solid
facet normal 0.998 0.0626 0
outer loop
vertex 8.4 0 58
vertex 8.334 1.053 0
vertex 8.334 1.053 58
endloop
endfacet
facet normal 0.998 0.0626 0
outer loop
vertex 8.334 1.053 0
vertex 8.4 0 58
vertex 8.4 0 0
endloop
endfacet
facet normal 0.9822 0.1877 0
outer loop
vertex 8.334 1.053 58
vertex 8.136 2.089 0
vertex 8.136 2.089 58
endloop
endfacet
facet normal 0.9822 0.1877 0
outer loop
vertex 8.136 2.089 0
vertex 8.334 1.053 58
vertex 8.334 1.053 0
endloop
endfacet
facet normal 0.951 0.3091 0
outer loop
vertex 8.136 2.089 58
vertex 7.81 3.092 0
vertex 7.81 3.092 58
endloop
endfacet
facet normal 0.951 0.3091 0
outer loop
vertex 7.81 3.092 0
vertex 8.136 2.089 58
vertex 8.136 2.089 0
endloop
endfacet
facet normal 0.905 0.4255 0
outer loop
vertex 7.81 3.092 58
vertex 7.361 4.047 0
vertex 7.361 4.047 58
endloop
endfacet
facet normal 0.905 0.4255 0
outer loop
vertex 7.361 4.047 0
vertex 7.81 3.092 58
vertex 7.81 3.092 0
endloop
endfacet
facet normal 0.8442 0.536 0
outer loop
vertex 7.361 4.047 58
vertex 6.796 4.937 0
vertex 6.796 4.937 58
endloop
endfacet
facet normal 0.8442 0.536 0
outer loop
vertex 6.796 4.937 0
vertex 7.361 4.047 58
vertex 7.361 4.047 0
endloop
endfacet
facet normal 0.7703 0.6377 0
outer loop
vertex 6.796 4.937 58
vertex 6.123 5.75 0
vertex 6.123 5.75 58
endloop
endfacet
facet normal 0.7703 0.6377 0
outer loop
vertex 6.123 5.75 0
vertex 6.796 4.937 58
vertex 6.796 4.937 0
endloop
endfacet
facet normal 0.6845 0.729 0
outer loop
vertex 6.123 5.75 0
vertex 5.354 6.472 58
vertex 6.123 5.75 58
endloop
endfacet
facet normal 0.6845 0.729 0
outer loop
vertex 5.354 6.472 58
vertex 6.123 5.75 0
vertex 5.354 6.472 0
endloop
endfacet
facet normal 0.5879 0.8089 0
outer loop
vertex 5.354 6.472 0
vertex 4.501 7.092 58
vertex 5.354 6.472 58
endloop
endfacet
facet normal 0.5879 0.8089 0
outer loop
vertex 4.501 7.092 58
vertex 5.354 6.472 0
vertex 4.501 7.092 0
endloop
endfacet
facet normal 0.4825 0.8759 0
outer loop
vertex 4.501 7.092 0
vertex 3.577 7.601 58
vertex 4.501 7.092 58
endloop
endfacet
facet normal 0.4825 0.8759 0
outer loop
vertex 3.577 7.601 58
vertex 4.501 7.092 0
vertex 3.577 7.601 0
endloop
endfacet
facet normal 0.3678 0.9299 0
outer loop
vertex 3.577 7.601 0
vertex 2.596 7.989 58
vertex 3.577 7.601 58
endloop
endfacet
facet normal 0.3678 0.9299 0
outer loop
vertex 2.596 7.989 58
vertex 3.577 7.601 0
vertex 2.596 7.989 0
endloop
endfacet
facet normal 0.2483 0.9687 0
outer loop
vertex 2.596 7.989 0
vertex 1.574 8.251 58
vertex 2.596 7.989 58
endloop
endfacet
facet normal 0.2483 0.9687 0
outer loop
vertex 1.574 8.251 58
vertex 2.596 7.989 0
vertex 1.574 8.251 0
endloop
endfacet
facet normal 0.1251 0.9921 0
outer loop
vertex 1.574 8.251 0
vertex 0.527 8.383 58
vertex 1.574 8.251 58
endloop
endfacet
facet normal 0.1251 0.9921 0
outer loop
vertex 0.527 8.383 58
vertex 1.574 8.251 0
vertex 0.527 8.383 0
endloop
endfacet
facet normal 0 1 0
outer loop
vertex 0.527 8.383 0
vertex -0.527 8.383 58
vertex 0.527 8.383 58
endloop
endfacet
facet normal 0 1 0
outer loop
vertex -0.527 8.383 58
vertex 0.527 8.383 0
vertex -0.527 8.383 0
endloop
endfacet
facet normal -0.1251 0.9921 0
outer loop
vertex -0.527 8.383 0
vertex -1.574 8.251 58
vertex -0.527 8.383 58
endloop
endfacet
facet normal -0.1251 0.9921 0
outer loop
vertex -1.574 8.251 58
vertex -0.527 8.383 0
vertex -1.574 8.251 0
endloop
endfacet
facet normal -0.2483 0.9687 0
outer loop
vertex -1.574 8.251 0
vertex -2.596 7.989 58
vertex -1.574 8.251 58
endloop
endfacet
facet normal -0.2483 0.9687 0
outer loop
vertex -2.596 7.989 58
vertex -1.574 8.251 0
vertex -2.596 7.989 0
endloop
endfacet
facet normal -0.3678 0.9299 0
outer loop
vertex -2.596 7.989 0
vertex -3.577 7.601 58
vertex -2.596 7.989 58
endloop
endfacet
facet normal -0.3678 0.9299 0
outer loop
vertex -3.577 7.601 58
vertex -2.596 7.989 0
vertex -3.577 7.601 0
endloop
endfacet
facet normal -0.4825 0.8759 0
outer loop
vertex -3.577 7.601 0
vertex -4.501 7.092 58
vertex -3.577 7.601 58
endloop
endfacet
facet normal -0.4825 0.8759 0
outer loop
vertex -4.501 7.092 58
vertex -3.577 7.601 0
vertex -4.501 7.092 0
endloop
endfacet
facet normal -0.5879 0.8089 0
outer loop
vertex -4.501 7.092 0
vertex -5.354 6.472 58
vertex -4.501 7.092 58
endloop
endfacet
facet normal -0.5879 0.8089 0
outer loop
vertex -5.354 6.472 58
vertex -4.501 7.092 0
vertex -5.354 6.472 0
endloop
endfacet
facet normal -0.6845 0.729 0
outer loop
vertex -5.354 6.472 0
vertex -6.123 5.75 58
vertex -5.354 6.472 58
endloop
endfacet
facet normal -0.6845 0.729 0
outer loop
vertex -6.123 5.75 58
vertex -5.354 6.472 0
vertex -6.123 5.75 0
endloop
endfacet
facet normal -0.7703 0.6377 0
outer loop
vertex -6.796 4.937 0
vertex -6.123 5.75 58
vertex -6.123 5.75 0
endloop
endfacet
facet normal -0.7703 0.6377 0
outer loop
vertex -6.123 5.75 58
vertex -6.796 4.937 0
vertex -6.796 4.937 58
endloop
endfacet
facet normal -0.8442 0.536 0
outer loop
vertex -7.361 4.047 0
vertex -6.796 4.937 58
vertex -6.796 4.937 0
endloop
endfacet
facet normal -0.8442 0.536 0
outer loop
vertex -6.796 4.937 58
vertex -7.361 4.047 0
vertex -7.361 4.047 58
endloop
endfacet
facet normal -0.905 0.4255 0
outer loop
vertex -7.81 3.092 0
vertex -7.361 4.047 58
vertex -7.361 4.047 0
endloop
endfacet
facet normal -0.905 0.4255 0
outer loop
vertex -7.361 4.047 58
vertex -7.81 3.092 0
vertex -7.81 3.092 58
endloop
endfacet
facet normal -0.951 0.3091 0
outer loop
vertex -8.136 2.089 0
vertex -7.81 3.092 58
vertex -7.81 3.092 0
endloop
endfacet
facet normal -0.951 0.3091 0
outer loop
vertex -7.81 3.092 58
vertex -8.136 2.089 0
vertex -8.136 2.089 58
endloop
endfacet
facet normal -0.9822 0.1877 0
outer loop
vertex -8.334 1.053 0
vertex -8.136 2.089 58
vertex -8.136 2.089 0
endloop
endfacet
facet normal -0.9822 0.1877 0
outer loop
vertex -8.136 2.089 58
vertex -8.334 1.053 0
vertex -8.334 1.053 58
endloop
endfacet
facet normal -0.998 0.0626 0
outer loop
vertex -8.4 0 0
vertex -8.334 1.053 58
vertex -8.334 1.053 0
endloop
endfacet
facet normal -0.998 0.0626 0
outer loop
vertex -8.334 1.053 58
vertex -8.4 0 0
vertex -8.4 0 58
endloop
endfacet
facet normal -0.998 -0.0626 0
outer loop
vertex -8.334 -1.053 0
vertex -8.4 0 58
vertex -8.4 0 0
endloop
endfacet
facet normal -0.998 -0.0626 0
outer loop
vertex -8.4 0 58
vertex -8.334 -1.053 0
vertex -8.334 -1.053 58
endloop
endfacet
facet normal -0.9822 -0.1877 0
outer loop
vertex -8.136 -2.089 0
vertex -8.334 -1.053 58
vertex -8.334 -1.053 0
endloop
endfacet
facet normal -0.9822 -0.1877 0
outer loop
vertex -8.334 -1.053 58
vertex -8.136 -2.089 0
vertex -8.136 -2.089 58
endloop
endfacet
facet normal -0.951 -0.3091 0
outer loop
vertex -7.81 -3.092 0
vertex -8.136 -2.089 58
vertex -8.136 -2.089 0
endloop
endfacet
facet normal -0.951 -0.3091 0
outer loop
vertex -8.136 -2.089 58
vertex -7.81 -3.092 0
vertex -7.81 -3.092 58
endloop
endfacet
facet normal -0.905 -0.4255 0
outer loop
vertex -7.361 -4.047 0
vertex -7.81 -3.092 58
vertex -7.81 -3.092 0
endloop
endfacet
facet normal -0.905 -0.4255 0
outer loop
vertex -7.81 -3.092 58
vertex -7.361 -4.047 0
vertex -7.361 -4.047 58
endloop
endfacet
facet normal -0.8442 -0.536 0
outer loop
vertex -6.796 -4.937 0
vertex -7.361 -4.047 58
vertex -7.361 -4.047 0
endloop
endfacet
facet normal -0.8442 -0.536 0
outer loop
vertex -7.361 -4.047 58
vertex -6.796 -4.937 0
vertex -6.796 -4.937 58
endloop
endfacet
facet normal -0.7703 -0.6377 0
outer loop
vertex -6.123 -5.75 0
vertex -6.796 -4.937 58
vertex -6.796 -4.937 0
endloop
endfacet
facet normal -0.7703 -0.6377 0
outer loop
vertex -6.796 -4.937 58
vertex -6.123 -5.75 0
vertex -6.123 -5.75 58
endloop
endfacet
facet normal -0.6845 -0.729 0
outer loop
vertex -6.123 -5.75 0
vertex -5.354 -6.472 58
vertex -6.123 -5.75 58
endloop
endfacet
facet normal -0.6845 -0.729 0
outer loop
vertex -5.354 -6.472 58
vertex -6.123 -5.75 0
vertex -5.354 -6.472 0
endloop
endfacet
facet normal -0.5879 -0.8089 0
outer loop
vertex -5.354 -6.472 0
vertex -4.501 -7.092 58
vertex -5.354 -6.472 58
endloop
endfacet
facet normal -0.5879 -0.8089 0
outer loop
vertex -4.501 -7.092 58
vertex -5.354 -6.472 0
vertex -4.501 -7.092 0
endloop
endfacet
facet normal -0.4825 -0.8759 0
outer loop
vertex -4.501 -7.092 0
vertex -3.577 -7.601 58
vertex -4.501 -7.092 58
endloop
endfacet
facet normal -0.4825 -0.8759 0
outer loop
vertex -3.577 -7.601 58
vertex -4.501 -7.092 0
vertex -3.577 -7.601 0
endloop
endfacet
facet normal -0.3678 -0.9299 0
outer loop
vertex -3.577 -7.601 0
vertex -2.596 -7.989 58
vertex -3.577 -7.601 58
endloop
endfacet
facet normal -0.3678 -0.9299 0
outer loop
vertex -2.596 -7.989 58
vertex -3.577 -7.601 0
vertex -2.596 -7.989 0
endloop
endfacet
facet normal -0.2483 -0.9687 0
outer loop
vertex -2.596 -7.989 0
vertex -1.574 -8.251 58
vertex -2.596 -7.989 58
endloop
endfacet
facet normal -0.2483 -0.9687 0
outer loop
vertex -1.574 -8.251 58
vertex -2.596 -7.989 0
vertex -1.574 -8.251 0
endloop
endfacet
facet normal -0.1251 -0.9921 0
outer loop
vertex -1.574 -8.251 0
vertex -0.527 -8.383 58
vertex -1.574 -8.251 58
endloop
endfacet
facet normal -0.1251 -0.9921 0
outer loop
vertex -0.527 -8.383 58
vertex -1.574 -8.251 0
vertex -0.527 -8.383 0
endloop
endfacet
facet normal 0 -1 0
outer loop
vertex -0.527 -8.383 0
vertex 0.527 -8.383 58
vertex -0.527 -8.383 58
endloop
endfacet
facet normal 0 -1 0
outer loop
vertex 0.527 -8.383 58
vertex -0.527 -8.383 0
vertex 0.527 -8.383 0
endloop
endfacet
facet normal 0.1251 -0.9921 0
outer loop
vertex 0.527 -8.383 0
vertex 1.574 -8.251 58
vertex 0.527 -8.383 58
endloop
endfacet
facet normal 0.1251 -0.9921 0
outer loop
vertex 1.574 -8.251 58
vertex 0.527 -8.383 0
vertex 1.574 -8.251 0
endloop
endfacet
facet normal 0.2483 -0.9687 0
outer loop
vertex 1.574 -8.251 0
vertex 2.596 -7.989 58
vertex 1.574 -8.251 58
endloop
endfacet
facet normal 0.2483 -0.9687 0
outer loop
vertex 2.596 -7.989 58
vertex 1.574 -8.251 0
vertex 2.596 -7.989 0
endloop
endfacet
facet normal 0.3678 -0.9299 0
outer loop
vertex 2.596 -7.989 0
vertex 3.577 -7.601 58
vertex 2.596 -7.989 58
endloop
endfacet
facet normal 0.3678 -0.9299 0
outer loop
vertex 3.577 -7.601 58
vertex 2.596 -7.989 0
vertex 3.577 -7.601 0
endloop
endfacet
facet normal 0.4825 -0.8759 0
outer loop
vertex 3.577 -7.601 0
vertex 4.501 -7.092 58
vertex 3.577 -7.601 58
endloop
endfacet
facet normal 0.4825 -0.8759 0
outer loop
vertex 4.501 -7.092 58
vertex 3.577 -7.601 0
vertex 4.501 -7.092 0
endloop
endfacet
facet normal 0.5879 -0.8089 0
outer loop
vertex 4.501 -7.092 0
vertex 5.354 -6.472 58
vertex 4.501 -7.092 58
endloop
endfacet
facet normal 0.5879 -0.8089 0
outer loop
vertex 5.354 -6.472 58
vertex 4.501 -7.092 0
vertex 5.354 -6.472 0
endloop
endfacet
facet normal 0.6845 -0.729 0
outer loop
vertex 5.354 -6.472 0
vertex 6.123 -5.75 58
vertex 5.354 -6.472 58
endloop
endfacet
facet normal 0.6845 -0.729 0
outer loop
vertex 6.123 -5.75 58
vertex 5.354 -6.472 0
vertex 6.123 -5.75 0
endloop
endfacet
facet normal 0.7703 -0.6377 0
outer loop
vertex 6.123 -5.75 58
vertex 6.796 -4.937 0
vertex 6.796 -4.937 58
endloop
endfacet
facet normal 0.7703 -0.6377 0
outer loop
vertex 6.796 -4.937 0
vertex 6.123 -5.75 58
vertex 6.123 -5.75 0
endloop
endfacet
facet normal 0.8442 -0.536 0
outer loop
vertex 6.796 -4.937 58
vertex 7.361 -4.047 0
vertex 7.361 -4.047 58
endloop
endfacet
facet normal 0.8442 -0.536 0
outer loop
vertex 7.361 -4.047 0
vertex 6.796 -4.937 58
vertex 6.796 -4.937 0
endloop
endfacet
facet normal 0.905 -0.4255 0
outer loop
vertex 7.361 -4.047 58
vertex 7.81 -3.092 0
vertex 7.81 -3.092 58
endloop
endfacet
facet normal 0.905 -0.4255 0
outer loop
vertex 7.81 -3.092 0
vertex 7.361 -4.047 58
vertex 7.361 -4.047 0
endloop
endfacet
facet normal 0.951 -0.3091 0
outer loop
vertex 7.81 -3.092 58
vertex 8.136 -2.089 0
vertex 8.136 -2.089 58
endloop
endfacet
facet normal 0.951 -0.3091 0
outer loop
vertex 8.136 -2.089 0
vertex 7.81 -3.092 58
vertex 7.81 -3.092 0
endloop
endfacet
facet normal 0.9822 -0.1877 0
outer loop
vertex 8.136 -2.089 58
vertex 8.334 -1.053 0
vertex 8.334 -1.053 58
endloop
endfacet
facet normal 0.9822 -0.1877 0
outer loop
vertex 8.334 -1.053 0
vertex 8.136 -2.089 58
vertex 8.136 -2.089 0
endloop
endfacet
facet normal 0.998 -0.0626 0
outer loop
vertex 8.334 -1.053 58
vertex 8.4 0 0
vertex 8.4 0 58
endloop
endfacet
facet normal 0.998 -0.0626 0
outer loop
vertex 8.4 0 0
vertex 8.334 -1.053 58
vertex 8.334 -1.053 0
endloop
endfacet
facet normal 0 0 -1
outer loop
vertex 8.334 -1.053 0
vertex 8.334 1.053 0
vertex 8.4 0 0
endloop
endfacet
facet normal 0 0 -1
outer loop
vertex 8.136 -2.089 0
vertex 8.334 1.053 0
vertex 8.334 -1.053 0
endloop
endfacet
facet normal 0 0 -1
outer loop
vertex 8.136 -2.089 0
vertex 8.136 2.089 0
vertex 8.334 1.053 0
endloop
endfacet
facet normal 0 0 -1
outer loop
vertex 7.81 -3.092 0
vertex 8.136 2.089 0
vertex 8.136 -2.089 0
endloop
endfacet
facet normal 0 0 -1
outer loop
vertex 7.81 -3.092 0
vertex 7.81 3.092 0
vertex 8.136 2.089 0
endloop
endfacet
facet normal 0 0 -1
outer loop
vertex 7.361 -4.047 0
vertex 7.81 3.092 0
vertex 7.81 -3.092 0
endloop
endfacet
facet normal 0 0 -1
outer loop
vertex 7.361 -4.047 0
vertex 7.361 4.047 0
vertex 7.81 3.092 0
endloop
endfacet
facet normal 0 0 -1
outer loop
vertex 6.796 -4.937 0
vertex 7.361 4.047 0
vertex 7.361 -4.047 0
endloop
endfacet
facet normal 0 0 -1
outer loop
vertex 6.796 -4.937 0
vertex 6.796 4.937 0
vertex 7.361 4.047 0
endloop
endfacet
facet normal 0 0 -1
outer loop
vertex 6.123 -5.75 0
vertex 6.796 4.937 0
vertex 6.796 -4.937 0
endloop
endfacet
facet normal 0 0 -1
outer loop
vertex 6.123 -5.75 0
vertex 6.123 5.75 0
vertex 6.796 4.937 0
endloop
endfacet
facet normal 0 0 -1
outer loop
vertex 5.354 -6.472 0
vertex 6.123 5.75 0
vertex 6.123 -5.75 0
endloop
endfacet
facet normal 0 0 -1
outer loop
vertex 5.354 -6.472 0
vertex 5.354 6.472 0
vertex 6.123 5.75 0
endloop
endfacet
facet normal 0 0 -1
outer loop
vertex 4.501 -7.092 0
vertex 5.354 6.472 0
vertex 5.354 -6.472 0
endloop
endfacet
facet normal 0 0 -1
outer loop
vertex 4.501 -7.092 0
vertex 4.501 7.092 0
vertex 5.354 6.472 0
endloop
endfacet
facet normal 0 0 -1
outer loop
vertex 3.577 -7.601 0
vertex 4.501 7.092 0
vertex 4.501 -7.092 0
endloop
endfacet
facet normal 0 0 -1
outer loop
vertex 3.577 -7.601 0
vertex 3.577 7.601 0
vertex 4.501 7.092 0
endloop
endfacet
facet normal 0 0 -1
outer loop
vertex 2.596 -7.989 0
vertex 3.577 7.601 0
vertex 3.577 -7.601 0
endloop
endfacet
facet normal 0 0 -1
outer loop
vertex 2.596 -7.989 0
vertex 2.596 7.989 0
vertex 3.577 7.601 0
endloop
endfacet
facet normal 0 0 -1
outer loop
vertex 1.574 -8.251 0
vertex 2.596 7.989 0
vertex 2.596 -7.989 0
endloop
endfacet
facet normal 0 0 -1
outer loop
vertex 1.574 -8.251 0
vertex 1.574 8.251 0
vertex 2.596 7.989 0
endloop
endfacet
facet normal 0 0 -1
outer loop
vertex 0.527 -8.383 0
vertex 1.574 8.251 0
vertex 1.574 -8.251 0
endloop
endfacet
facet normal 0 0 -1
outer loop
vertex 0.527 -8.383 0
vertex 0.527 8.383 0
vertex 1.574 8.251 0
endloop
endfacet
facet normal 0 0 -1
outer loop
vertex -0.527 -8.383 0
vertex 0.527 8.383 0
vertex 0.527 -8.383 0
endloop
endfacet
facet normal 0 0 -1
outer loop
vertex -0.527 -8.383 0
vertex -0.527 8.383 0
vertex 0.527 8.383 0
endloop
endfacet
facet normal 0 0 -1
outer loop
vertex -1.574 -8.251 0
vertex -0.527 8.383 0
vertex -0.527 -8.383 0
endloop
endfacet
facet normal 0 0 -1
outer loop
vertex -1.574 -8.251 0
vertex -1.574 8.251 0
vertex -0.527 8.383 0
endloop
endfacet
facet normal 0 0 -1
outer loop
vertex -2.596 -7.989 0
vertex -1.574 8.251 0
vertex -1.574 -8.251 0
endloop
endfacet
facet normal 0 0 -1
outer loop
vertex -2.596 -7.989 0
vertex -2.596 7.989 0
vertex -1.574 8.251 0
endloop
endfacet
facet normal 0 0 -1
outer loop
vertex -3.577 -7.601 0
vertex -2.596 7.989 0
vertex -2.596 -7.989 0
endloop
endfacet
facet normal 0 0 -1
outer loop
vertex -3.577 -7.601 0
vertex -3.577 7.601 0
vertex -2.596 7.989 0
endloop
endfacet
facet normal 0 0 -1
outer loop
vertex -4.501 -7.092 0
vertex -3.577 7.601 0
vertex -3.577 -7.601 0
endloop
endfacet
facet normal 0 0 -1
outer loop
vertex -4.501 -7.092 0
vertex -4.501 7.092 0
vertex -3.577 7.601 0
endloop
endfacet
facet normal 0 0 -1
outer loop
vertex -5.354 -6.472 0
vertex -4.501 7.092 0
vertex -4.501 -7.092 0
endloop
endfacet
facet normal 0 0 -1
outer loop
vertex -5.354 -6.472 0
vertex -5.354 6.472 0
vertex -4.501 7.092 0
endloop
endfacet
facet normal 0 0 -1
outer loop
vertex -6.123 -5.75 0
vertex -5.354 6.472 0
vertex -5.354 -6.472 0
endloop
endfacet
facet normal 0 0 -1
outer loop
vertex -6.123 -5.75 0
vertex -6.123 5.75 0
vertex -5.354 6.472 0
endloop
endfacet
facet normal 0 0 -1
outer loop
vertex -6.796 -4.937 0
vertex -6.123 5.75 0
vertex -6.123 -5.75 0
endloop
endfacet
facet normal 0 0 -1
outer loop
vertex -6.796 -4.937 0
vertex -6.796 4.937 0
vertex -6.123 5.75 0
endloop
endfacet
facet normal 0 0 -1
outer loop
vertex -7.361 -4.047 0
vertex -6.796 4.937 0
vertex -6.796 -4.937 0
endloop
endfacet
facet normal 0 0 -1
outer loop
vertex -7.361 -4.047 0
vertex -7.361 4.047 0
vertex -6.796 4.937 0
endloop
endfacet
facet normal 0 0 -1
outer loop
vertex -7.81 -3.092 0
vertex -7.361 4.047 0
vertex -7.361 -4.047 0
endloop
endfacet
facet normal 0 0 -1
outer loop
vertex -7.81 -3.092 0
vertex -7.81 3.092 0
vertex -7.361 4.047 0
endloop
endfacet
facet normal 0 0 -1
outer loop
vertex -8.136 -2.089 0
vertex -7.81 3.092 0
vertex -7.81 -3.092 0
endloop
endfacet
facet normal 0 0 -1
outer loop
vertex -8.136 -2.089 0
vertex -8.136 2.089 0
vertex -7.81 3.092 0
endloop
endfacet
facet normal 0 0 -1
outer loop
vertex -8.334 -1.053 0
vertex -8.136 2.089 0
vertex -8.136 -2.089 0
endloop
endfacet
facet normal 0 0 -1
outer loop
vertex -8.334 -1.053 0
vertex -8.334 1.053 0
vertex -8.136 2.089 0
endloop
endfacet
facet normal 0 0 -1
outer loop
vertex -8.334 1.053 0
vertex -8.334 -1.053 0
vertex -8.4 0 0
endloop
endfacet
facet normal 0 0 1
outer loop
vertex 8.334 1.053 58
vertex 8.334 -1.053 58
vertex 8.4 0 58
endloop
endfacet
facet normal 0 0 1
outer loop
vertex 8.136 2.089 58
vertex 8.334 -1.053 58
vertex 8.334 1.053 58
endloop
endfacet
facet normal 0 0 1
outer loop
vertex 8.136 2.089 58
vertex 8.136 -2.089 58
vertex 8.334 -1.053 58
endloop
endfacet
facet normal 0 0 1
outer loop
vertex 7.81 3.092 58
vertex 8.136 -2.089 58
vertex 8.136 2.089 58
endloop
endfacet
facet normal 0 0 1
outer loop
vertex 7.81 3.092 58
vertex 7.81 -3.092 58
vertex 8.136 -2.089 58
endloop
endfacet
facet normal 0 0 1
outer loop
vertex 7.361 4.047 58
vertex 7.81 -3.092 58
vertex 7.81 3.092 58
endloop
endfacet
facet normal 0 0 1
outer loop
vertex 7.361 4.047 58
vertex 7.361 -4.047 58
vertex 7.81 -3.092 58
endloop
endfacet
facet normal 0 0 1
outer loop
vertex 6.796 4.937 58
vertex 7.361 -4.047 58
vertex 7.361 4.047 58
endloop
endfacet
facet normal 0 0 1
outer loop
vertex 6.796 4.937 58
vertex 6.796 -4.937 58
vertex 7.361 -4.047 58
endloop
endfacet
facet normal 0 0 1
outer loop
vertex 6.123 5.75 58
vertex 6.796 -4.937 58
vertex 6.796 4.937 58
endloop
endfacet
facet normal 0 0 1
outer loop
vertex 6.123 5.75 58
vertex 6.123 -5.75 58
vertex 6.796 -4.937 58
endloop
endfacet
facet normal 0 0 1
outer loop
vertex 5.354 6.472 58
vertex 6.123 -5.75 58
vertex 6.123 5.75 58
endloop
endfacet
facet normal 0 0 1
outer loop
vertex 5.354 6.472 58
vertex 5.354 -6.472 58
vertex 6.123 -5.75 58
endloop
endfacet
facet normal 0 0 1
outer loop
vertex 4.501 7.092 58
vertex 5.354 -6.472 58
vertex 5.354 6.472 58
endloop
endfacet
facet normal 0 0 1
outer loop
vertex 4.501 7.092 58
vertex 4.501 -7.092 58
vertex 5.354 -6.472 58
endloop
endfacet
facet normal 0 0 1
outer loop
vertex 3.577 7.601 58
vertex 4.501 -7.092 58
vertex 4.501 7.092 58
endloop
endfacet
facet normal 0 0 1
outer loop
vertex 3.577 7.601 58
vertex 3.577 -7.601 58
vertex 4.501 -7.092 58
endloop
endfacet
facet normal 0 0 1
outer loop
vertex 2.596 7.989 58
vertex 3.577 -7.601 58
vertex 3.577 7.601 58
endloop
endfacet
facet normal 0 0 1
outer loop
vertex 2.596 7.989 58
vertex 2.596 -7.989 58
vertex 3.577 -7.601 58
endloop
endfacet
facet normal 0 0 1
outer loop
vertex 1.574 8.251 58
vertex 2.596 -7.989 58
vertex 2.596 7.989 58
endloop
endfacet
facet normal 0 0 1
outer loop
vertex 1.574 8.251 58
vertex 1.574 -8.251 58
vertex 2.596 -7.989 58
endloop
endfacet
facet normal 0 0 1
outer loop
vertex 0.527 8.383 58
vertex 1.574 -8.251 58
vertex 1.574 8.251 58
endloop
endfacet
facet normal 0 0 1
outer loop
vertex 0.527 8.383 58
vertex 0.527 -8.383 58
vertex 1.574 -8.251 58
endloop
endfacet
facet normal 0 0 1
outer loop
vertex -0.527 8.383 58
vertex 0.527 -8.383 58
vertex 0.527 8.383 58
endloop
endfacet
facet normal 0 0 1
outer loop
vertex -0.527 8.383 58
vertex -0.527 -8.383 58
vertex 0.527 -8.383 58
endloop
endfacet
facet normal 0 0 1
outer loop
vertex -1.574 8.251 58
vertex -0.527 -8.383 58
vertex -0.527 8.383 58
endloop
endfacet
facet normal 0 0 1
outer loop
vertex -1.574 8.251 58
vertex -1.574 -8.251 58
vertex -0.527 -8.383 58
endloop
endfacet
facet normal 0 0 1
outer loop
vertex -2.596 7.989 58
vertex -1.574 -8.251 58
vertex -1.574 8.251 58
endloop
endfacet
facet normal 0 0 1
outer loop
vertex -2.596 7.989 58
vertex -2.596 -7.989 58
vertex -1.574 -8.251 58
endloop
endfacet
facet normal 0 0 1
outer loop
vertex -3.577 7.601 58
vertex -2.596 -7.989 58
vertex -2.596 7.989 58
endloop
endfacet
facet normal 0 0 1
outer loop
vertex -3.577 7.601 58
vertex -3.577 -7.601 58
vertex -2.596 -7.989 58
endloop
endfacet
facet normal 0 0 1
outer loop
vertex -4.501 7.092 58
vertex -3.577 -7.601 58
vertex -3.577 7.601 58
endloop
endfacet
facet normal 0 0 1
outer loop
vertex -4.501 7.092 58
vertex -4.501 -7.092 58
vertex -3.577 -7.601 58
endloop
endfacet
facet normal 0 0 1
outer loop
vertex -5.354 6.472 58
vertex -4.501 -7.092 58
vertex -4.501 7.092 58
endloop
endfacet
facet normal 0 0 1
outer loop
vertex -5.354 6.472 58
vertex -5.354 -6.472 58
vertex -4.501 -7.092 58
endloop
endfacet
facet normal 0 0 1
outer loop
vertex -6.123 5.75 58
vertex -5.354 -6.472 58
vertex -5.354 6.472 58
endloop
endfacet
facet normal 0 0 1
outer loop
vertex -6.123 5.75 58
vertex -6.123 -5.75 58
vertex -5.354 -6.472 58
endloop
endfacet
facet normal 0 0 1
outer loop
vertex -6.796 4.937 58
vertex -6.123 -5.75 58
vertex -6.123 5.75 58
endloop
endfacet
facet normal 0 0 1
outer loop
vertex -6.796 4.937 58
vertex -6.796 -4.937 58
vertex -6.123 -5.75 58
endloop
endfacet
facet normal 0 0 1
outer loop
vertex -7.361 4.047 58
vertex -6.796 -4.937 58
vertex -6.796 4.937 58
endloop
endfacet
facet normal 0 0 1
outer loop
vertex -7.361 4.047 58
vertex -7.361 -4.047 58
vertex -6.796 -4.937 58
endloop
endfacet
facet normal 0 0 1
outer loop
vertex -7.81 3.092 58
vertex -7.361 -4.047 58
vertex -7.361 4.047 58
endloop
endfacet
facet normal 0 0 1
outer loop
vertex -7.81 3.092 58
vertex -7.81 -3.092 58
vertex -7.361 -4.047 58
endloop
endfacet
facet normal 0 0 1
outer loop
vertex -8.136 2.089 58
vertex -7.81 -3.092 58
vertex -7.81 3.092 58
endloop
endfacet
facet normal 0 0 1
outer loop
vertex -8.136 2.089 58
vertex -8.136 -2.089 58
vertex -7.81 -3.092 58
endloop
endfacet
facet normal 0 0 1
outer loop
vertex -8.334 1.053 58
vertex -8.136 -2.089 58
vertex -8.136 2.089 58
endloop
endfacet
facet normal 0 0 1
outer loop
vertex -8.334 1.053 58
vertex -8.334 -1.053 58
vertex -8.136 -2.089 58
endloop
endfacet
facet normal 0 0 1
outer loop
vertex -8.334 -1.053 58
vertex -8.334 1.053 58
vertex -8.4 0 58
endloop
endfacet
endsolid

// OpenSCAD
$fn=50;
function HotEndDiam() = 16;
function HotEndRecessDiam() = 7;
function HotEndRecessHeight() = 2;
function HotEndRecessDepth() = 1.95;
function HotEndRecessOffset() = 2.6;
function HotEndLength() = 58;

module HotEnd(ScrewChannel=false,3dPrinterTolerance=.4){
	if(ScrewChannel==false){	
		cylinder(HotEndLength(),HotEndDiam()/2+3dPrinterTolerance,HotEndDiam()/2+3dPrinterTolerance);
	}else{
		difference(){
			cylinder(HotEndLength(),HotEndDiam()/2+3dPrinterTolerance,HotEndDiam()/2+3dPrinterTolerance);
			translate([0,0,HotEndLength()-HotEndRecessOffset()]){
				difference(){
					cylinder(HotEndRecessHeight(),HotEndDiam()/2+1+3dPrinterTolerance,HotEndDiam()/2+1+3dPrinterTolerance);
					cylinder(HotEndRecessHeight(),(HotEndDiam()-HotEndRecessDepth())/2+.4+3dPrinterTolerance,(HotEndDiam()-HotEndRecessDepth())/2+.4+3dPrinterTolerance);
				}
			}
		}
	}
}

HotEnd(false,.4);		
